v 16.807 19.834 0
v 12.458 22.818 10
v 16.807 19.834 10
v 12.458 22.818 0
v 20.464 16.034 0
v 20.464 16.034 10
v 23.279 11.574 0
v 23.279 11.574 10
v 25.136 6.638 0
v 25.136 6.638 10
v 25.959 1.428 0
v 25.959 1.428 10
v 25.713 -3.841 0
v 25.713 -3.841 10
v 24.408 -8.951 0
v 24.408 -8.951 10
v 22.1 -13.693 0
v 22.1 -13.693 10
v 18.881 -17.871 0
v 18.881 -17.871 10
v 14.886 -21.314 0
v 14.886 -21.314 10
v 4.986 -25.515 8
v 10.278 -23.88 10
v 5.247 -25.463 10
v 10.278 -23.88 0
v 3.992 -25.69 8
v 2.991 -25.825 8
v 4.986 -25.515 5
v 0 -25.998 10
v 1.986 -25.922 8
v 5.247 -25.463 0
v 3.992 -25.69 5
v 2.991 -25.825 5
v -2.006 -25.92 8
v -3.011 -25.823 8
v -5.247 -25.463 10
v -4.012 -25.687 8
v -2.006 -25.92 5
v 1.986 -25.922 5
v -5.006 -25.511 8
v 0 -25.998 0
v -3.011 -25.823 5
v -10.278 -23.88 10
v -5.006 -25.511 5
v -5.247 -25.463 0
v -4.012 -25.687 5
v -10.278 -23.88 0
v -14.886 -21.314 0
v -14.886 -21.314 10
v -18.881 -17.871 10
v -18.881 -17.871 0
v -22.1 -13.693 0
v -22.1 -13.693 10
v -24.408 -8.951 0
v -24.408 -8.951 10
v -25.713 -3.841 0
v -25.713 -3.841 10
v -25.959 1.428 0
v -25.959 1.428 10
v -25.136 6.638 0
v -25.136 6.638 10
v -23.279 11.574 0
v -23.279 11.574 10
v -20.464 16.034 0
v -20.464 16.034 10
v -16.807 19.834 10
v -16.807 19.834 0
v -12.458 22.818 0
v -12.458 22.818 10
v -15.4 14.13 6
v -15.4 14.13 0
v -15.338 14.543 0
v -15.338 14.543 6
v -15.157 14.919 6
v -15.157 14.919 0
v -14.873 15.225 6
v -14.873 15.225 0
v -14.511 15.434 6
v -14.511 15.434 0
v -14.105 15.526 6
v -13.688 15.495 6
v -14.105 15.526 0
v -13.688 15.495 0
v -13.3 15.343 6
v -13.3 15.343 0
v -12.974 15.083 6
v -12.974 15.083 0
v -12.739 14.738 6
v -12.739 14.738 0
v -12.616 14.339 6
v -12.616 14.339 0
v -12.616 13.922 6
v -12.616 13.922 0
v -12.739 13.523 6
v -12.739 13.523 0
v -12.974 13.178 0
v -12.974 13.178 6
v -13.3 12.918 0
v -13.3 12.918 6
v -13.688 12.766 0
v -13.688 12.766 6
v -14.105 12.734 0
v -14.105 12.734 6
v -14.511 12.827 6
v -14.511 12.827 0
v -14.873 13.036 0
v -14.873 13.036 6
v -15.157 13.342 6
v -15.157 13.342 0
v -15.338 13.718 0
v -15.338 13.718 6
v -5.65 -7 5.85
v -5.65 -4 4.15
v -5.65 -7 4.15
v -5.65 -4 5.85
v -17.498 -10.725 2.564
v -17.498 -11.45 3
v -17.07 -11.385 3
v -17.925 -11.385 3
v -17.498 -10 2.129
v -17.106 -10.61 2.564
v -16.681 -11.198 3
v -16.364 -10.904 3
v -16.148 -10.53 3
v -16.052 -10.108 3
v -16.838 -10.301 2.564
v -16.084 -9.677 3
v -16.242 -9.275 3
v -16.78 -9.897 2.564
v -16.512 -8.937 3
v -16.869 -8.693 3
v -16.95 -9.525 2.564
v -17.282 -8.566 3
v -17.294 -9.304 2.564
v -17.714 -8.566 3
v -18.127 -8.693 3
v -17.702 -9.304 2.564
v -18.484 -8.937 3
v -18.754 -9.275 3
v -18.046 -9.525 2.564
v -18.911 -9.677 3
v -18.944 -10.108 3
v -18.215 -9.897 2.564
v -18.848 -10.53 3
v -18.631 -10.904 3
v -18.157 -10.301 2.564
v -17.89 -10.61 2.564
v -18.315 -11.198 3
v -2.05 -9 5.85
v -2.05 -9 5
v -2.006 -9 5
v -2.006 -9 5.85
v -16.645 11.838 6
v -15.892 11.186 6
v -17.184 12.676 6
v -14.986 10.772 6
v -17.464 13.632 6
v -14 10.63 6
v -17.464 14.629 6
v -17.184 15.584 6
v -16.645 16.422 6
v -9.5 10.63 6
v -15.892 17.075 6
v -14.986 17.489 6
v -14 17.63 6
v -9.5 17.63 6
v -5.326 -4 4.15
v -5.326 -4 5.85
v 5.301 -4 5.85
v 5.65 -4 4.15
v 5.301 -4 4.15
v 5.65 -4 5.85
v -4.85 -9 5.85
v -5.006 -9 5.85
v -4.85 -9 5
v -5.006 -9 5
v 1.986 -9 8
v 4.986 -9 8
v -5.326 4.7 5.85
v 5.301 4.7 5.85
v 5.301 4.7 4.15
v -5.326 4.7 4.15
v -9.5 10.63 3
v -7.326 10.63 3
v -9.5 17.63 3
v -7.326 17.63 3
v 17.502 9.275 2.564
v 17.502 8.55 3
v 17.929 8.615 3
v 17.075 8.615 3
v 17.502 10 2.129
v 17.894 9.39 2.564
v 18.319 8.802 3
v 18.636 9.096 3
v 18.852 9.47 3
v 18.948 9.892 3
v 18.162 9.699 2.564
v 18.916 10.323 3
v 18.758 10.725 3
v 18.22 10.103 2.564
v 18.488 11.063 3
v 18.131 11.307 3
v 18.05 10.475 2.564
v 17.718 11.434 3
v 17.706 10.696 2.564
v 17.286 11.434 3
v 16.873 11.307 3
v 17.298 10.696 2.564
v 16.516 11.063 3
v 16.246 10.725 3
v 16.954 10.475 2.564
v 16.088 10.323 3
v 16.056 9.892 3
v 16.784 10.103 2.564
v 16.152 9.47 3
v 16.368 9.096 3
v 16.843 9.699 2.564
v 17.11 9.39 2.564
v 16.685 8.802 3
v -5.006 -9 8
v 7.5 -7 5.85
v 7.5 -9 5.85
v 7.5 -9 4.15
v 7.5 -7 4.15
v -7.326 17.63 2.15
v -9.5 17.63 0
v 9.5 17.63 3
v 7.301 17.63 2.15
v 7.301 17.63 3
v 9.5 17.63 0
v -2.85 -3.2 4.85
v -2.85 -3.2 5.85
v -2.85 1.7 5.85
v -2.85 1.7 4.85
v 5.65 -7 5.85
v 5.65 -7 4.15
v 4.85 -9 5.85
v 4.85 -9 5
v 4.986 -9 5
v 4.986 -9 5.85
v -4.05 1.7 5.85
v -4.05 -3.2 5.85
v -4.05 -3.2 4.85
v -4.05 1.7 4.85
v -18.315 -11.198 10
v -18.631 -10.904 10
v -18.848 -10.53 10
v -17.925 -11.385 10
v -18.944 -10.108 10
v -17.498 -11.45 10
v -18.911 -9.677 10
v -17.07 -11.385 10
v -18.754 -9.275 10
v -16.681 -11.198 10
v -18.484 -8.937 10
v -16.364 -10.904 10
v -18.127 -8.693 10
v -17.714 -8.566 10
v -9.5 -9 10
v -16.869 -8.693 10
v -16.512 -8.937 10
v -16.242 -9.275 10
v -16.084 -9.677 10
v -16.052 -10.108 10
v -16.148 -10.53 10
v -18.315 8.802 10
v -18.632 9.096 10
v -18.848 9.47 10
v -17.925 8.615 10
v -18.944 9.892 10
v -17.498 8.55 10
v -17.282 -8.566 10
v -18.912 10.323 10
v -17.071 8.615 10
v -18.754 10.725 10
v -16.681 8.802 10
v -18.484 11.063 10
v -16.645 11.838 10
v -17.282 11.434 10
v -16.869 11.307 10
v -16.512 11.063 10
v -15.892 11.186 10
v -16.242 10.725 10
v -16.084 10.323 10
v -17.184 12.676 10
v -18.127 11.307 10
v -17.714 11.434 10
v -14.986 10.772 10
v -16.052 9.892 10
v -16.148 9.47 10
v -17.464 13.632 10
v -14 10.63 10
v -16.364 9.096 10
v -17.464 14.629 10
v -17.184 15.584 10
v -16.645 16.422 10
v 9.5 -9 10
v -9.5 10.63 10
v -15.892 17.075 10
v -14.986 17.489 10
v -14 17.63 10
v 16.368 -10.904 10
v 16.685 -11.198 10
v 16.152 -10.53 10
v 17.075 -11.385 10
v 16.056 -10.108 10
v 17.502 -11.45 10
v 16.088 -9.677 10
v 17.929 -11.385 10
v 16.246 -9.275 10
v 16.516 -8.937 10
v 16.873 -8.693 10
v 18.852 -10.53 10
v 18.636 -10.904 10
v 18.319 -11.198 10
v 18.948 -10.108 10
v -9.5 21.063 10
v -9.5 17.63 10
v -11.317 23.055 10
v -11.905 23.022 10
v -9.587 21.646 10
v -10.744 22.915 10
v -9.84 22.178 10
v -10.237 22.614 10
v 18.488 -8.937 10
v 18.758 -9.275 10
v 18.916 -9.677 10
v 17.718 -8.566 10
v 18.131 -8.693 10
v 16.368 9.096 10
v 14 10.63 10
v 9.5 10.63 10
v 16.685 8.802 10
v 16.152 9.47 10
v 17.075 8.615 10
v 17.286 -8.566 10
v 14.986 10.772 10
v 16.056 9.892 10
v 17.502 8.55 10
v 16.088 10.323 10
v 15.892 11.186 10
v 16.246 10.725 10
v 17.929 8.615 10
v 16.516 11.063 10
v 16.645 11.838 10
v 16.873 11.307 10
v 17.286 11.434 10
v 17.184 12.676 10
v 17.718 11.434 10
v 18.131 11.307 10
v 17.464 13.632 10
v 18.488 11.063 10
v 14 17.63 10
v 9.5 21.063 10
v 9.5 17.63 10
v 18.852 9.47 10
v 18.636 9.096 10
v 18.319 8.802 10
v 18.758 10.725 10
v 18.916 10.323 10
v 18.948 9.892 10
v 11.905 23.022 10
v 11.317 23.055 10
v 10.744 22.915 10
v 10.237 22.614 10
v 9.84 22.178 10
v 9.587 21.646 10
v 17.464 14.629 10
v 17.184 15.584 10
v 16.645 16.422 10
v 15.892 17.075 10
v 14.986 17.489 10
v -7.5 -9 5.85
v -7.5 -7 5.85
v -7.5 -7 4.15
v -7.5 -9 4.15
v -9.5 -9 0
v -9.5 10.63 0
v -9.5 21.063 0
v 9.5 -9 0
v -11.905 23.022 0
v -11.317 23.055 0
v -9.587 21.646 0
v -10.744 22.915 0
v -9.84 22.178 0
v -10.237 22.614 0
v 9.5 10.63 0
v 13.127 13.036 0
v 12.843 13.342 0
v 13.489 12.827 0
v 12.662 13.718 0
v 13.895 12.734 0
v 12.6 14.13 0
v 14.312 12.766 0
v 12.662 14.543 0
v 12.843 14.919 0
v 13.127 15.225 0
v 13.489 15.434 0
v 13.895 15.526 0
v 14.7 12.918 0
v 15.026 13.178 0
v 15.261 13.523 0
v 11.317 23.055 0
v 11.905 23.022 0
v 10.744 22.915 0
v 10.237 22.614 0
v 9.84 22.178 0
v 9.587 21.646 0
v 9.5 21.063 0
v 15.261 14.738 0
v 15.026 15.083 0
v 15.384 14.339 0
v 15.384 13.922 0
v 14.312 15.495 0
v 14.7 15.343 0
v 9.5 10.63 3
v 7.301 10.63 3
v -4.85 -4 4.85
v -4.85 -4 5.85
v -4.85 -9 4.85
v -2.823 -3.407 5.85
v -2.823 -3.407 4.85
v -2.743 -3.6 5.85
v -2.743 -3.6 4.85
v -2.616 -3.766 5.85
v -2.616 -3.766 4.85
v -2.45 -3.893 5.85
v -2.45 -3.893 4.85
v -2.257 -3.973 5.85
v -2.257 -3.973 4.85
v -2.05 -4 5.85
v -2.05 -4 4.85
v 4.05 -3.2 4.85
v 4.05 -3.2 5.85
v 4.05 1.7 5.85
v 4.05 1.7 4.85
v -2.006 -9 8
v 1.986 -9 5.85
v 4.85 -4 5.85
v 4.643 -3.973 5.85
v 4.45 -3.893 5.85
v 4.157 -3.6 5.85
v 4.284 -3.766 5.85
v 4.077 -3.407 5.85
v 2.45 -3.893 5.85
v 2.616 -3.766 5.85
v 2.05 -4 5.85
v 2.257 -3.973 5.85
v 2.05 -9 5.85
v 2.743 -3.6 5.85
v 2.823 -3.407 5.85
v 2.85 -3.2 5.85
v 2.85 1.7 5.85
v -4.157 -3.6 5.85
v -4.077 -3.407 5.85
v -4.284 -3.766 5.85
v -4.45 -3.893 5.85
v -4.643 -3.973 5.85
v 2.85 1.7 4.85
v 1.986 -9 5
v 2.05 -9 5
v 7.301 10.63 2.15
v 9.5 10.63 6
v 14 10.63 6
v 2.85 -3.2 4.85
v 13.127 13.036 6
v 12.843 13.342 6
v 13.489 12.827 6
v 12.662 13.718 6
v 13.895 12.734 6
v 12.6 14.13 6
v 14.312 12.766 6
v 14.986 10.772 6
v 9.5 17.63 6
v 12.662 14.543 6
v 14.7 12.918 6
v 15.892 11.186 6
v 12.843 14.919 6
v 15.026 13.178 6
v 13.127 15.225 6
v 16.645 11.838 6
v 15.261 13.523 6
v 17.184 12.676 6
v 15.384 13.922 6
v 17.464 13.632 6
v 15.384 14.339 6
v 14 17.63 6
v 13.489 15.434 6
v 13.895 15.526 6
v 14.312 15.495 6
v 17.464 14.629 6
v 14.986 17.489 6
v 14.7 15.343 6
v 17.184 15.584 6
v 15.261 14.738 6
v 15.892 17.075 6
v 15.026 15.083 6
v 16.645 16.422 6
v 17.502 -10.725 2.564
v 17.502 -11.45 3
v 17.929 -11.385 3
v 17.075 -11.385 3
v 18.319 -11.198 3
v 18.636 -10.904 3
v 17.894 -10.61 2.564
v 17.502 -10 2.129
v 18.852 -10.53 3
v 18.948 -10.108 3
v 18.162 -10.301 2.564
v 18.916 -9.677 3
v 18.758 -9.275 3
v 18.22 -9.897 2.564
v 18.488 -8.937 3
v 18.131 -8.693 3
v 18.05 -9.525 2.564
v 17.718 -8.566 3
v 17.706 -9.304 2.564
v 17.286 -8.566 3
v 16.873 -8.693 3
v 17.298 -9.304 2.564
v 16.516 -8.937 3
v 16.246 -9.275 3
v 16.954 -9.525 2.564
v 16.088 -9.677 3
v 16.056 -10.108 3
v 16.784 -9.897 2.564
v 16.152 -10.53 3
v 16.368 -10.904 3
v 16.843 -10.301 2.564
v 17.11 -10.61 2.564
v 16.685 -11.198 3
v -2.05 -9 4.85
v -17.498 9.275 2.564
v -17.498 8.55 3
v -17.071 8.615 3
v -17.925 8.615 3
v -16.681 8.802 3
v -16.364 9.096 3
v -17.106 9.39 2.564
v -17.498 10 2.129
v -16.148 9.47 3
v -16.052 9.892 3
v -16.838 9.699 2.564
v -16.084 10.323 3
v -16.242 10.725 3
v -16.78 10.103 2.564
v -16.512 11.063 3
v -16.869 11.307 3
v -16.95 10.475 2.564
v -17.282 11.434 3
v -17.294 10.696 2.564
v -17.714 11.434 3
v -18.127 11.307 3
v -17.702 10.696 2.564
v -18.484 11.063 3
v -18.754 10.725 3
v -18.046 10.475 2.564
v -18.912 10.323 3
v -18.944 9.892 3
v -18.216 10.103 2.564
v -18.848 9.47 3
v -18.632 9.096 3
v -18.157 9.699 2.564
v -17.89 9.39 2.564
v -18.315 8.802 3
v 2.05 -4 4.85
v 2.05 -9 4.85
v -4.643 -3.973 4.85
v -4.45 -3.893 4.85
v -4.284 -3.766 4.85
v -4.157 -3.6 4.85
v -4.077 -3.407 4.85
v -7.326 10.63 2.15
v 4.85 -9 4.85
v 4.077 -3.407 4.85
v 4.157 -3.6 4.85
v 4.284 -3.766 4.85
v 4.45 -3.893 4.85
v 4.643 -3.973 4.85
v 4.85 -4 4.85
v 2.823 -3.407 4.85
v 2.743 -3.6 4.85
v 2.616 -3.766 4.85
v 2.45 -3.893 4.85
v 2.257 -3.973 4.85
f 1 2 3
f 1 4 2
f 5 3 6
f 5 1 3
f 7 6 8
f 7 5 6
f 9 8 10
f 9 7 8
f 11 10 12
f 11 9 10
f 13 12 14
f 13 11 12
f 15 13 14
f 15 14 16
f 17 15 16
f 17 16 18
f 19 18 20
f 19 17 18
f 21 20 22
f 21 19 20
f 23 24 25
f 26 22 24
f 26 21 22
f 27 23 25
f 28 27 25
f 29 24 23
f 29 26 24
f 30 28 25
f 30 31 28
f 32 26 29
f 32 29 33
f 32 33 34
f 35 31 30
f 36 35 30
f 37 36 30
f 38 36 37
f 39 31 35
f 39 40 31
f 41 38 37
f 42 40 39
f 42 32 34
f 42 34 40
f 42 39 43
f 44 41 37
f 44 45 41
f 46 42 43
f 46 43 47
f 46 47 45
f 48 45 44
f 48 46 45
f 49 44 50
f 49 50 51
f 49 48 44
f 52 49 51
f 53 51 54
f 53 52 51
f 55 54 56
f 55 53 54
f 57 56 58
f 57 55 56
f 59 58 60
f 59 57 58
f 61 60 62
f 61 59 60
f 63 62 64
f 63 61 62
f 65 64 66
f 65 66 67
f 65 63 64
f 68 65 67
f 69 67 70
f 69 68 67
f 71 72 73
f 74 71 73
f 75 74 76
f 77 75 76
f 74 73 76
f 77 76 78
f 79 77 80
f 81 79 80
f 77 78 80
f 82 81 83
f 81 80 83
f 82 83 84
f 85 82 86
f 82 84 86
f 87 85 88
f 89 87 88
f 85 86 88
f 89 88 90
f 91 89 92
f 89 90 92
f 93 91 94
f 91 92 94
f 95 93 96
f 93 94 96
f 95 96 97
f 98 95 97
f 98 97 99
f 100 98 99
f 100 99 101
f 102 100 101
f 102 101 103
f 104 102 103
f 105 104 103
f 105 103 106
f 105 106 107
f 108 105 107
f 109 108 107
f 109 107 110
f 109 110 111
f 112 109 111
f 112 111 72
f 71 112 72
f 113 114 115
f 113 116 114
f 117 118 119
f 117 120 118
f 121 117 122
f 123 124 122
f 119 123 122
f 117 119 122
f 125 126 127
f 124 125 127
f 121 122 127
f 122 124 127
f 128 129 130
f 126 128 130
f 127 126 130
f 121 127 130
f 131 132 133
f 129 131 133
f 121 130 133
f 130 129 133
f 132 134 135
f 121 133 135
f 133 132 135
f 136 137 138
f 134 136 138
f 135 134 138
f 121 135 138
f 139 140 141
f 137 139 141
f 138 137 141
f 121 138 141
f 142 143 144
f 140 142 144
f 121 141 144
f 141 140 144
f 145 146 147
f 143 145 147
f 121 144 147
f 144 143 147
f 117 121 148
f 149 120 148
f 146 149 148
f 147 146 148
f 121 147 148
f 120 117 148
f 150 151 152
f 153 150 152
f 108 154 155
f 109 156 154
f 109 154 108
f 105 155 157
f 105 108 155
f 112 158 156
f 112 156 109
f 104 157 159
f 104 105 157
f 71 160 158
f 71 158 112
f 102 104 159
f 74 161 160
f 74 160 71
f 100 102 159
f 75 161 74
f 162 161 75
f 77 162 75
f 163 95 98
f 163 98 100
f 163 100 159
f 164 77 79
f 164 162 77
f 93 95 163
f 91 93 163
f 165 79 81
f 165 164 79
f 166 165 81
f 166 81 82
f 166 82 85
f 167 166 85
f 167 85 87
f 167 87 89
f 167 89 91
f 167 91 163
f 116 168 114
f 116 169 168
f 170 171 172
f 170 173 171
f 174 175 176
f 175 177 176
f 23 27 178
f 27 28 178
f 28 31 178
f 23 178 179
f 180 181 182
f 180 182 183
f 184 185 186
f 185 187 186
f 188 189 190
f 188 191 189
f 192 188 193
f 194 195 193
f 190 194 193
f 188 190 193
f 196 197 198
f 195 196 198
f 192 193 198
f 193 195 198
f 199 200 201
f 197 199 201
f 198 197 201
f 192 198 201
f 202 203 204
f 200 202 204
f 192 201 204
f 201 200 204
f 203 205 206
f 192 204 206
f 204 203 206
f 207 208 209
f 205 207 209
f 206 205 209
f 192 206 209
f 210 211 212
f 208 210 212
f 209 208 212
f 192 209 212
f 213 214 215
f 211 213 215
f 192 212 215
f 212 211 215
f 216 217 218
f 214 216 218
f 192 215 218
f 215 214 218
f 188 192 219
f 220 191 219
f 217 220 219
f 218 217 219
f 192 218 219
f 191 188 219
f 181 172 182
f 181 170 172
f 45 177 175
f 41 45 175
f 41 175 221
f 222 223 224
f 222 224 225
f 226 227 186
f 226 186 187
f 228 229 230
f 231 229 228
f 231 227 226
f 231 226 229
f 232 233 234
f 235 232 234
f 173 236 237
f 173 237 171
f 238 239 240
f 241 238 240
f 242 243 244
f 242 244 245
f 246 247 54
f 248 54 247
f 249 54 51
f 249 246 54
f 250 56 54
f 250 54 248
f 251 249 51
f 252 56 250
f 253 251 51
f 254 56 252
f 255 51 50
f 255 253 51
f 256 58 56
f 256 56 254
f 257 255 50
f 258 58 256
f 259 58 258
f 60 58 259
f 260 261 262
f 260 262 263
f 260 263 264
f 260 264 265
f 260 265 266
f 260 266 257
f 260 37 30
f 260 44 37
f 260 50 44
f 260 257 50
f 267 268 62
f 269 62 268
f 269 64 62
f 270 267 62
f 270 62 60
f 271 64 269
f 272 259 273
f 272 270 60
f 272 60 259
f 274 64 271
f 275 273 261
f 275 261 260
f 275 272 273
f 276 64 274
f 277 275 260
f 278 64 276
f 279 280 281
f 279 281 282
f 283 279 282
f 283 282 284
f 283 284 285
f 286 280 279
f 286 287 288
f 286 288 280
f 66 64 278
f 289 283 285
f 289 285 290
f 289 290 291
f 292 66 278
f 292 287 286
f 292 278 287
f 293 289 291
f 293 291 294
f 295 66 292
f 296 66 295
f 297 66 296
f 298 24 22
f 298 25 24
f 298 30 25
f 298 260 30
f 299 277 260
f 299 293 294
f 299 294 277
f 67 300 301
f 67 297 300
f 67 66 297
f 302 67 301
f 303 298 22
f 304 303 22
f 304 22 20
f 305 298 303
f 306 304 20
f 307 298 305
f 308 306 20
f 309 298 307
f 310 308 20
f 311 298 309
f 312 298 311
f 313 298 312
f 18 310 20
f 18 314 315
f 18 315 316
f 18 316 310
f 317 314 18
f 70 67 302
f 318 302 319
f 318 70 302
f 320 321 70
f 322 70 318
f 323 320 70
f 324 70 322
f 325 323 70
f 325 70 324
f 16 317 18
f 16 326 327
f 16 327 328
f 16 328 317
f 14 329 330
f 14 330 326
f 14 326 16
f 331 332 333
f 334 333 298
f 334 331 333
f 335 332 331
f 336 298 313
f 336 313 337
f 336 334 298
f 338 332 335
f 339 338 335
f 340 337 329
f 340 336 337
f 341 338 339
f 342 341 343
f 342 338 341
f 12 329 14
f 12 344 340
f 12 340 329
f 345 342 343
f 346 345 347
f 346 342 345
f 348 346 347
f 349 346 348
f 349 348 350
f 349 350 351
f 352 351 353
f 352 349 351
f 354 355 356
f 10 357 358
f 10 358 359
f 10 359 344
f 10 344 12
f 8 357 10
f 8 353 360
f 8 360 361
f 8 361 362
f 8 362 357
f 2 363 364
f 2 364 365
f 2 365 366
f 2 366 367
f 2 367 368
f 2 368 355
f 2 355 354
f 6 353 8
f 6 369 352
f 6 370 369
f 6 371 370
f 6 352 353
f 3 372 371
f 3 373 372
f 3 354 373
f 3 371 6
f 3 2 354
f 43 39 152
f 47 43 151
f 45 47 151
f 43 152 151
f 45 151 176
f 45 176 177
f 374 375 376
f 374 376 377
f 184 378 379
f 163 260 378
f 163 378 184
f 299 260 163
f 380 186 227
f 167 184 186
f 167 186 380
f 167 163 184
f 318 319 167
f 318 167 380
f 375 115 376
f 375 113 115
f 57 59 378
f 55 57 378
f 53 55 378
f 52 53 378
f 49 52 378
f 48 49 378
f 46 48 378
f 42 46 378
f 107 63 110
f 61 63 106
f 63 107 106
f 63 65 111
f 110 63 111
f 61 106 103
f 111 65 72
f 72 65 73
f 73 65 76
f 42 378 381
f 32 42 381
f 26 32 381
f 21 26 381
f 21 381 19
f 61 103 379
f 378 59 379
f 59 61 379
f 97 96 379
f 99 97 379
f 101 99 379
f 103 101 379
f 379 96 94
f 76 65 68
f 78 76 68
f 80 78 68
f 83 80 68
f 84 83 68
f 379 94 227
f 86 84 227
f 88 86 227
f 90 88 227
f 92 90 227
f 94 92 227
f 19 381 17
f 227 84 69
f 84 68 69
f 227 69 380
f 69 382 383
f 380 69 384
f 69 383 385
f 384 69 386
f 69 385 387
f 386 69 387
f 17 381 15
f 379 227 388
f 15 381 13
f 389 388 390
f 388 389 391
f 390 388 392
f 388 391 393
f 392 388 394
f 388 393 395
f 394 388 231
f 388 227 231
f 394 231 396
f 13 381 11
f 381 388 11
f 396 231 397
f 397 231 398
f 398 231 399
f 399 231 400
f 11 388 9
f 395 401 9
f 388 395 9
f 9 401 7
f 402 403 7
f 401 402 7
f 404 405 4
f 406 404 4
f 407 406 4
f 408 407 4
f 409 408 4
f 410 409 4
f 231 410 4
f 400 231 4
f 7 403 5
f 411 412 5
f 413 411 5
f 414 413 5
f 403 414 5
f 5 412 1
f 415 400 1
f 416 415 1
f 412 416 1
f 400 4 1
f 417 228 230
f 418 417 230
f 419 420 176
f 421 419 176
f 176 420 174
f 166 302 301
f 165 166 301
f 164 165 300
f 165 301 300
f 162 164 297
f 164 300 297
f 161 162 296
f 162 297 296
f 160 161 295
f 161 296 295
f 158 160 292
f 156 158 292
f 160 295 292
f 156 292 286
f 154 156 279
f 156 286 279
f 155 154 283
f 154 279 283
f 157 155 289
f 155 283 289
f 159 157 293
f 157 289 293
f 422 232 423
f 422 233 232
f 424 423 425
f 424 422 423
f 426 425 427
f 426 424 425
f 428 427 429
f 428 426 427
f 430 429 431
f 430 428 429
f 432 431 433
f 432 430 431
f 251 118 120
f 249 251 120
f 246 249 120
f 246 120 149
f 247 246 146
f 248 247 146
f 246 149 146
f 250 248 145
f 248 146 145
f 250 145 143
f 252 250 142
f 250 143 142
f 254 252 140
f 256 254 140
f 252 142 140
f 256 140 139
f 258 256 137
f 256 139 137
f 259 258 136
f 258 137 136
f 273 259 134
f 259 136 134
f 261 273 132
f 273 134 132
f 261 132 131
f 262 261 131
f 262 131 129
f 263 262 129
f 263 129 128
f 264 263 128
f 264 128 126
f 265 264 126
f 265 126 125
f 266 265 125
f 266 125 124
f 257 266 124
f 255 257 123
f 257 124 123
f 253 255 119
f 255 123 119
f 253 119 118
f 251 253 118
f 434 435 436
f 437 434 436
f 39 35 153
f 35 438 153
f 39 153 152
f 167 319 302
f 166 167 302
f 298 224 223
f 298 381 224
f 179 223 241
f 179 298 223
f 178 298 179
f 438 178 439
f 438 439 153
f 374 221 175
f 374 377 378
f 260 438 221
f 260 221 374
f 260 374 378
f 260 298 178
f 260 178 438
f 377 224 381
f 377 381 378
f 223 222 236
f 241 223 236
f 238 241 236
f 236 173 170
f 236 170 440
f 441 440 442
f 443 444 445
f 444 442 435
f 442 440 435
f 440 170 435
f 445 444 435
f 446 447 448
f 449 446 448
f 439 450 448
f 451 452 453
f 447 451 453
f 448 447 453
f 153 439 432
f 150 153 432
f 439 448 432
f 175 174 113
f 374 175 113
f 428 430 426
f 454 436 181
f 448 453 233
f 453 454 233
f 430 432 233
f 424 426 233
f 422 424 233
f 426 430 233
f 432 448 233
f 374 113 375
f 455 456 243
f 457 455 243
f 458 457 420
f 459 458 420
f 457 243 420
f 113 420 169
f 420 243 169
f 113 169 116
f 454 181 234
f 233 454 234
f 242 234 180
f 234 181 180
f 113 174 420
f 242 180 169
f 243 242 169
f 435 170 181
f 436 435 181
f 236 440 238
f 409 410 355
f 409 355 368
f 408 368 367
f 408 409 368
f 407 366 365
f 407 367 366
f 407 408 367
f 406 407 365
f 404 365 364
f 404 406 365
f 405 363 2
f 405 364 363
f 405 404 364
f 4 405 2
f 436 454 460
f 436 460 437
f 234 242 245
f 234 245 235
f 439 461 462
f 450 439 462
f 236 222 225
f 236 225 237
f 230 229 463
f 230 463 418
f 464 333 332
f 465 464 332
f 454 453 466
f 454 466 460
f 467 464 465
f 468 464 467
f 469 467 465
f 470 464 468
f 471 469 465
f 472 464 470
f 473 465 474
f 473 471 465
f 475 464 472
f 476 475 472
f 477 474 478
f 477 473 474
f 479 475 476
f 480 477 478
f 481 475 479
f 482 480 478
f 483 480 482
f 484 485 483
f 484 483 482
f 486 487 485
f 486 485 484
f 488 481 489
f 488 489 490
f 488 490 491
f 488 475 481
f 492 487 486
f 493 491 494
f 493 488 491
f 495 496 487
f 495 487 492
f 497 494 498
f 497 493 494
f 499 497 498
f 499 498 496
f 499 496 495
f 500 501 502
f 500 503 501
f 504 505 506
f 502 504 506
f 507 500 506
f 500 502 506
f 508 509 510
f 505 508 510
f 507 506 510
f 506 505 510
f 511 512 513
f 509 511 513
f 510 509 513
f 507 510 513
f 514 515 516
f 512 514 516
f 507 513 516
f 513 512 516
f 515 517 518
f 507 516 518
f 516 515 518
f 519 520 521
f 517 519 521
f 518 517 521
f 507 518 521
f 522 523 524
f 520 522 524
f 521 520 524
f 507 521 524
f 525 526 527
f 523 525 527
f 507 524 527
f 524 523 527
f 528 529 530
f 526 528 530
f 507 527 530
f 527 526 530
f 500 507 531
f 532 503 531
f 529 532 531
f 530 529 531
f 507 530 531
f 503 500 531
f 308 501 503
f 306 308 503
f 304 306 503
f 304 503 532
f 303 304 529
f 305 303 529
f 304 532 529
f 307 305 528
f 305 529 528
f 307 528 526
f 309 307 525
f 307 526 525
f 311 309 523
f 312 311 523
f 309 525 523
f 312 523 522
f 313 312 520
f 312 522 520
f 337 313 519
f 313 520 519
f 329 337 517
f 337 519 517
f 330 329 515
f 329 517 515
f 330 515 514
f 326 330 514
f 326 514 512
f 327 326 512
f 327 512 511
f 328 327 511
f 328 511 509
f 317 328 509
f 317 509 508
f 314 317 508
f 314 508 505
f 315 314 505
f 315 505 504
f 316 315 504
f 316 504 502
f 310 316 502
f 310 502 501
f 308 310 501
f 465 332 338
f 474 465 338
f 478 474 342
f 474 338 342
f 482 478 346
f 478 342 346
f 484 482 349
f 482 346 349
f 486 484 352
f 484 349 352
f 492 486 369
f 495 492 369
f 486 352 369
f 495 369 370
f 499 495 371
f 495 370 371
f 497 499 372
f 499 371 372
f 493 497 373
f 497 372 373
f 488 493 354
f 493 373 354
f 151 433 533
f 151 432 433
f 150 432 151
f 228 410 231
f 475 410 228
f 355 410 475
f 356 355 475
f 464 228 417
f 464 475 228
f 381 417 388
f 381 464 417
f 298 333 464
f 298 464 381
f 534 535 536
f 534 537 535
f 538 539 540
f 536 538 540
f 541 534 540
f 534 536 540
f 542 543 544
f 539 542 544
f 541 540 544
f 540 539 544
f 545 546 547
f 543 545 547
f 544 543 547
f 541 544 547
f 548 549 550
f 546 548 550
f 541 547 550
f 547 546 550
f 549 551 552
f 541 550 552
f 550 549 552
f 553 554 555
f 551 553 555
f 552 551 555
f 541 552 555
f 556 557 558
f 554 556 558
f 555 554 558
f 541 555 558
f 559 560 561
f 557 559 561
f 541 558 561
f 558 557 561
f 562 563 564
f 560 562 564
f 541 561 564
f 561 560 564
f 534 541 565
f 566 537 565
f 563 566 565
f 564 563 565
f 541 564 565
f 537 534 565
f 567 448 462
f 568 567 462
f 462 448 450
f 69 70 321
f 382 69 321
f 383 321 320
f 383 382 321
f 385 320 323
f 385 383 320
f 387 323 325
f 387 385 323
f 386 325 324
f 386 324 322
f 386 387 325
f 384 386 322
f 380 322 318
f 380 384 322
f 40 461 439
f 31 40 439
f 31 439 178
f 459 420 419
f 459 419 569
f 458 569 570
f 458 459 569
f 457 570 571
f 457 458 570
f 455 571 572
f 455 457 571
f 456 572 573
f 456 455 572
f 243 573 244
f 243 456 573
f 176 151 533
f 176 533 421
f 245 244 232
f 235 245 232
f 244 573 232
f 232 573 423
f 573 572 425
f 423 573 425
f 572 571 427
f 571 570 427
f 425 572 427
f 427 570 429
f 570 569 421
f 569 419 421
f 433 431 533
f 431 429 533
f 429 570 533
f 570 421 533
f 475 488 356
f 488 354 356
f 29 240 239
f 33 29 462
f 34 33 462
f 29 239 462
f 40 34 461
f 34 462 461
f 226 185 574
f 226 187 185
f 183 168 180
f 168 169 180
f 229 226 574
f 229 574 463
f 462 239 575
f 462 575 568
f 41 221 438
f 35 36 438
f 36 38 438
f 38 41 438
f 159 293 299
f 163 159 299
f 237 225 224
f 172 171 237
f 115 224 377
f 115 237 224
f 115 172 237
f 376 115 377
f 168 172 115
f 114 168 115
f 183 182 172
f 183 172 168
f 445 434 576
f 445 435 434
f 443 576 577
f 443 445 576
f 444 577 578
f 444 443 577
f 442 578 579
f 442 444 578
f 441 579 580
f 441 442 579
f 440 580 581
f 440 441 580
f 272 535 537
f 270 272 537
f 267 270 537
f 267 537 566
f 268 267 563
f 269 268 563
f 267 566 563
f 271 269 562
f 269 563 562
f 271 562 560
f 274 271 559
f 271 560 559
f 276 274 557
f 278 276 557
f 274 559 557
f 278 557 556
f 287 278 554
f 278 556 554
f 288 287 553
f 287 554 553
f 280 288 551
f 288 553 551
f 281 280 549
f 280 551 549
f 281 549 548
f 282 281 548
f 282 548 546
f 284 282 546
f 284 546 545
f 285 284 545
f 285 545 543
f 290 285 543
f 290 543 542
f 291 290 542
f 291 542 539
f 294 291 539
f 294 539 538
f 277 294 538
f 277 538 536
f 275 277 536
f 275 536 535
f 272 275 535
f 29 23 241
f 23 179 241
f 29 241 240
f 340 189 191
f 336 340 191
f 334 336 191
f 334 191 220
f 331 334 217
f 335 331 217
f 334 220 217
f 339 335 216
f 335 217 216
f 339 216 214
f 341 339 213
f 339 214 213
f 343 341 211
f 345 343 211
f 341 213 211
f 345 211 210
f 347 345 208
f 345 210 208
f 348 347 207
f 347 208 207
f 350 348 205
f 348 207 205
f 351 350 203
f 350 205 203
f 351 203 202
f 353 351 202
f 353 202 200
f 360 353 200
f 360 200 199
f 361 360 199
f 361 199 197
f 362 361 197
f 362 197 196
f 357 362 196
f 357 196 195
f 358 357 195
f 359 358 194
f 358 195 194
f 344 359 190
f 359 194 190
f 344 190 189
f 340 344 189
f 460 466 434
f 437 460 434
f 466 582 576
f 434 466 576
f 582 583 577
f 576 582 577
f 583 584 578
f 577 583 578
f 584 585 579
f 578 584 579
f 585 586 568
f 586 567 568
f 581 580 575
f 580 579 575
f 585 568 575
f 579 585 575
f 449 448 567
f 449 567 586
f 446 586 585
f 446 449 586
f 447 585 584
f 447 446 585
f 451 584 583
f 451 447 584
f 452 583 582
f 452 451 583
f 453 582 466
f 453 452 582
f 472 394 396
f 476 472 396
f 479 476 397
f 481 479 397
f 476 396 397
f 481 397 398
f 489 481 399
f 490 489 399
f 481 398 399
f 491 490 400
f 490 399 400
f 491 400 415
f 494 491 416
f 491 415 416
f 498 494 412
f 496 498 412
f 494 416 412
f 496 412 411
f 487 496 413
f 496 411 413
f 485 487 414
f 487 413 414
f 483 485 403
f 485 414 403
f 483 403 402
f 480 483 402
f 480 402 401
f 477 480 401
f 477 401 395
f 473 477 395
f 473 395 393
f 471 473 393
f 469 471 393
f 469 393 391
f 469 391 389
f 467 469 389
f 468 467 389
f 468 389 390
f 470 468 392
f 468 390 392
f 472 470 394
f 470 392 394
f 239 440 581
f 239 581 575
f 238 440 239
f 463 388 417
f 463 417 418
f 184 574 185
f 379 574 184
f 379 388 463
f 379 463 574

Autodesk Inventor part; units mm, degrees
ref_plane "YZ Plane" through (0, 0, 0) normal (1, 0, 0) x (0, 1, 0)
ref_plane "XZ Plane" through (0, 0, 0) normal (0, 1, 0) x (-1, 0, 0)
ref_plane "XY Plane" through (0, 0, 0) normal (0, 0, 1) x (1, 0, 0)
ref_plane "Work Plane1" through (0, 0, 0) normal (0, 0, 1) x (1, 0, 0)
sketch "Sketch1" plane through (0, 0, 0) normal (0, 0, 1) x (1, 0, 0)
  circle A0 centre (0, 0) radius 25.9979 projected
  circle A1 centre (-9.4998, -11.0022) radius 2.6601 projected
  circle A2 centre (0.0001, -0.0022) radius 3.8801 projected
  circle A3 centre (0.0001, -0.0022) radius 6.7754 projected
  circle A4 centre (0.0001, -0.0022) radius 10
  point P0 (0, 0)
  dimension "d17" = 20
extrude "Extrusion1" add sketch "Sketch1" along normal blind 10 contours A0 | A1 | A2 | A3 | A4
ref_plane "Arbeitsebene4" through (0, 0, 5) normal (0, 0, -1) x (-1, 0, 0)
sketch "Skizze22" plane through (0, 0, 10) normal (0, 0, 1) x (1, 0, 0)
  circle A0 centre (0, 0) radius 25.9979 projected
  line L0 (-9.5, 60.9958) -> (9.5, 60.9958)
  line L1 (9.5, 60.9958) -> (9.5, -9)
  line L2 (9.5, -9) -> (-9.5, -9)
  line L3 (-9.5, -9) -> (-9.5, 60.9958)
  line L4 (-9.5, 60.9958) -> (9.5, -9) construction
  line L5 (9.5, 60.9958) -> (-9.5, -9) construction
  point P0 (0, 0)
  point P1 (0, 25.9979)
  point P2 (2.05, -9)
  dimension "d82" = 19
extrude "Extrusion16" cut sketch "Skizze22" against normal blind 10 contours L1 L2 L3 A0 | A0 L3 L0 L1 picked at (-1.0778, 2.5987)
sketch "Skizze23" plane through (0, 0, 5) normal (0, 0, -1) x (-1, 0, 0)
  line L0 (-5.5015, 4.1) -> (-5.3008, 4.7) projected
  line L1 (-5.3008, 4.7) -> (5.3257, 4.7) projected
  line L2 (5.3257, 4.7) -> (5.5015, 4.1) projected
  line L3 (5.5015, 4.1) -> (5.65, 3.9515) projected
  line L4 (5.65, 3.9515) -> (5.65, -4) projected
  line L5 (4.85, -4) -> (5.65, -4) projected
  arc A0 (4.05, -3.2) -> (4.85, -4) centre (4.85, -3.2) ccw projected
  line L6 (4.05, -3.2) -> (4.05, 1.7) projected
  line L7 (4.05, 1.7) -> (2.85, 1.7) projected
  line L8 (2.85, -3.2) -> (2.85, 1.7) projected
  arc A1 (2.05, -4) -> (2.85, -3.2) centre (2.05, -3.2) ccw projected
  line L9 (-2.05, -4) -> (2.05, -4) projected
  arc A2 (-2.85, -3.2) -> (-2.05, -4) centre (-2.05, -3.2) ccw projected
  line L10 (-2.85, -3.2) -> (-2.85, 1.7) projected
  line L11 (-2.85, 1.7) -> (-4.05, 1.7) projected
  line L12 (-4.05, -3.2) -> (-4.05, 1.7) projected
  arc A3 (-4.85, -4) -> (-4.05, -3.2) centre (-4.85, -3.2) ccw projected
  line L13 (-5.65, -4) -> (-4.85, -4) projected
  line L14 (-5.65, -4) -> (-5.65, 3.9515) projected
  line L15 (-5.65, 3.9515) -> (-5.5015, 4.1) projected
  line L16 (5.65, -4) -> (5.65, -7) projected
  line L17 (5.65, -7) -> (7.5, -7) projected
  line L18 (7.5, -7) -> (7.5, -9) projected
  line L19 (7.5, -9) -> (4.85, -9) projected
  line L20 (4.85, -6) -> (4.85, -9) projected
  line L21 (4.85, -4) -> (4.85, -6) projected
  line L22 (4.85, -4) -> (5.65, -4) projected
  line L23 (-5.65, -7) -> (-5.65, -4) projected
  line L24 (-5.65, -4) -> (-4.85, -4) projected
  line L25 (-4.85, -4) -> (-4.85, -6) projected
  line L26 (-4.85, -6) -> (-4.85, -9) projected
  line L27 (-4.85, -9) -> (-7.5, -9) projected
  line L28 (-7.5, -9) -> (-7.5, -7) projected
  line L29 (-7.5, -7) -> (-5.65, -7) projected
  line L30 (-4.85, -9) -> (4.85, -9)
  line L31 (5.65, -7) -> (5.3257, -7)
  line L32 (5.3257, -7) -> (5.3257, 4.7)
  line L33 (5.3257, 4.7) -> (5.65, 4.7)
  line L34 (5.65, 4.7) -> (5.65, -7)
  line L35 (-5.3008, 4.7) -> (-5.65, 4.7)
  line L36 (-5.65, 4.7) -> (-5.65, -7)
  line L37 (-5.65, -7) -> (-5.3008, -7)
  line L38 (-5.3008, -7) -> (-5.3008, 4.7)
  point P0 (5.3257, -4)
  point P1 (-5.3008, -4)
extrude "Extrusion17" add sketch "Skizze23" along normal mid plane 1.7 contours L1 L32 L5 A0 L6 L7 L8 A1 L9 A2 L10 L11 L12 A3 L13 L38 | L38 L37 L23 L13 | L13 L25 L26 L27 L28 L29 L37 L38 | L32 L31 L17 L18 L19 L20 L21 L5 | L5 L16 L31 L32 | A3 L12 L11 L10 A2 L9 A1 L8 L7 L6 A0 L21 L20 L30 L26 L25
sketch "Skizze24" plane through (0, 0, 5.85) normal (0, 0, -1) x (1, 0, 0)
  line L0 (2.85, 3.2) -> (2.85, -1.7) projected
  line L1 (2.85, -1.7) -> (4.05, -1.7) projected
  line L2 (4.05, 3.2) -> (4.05, -1.7) projected
  arc A0 (4.85, 4) -> (4.05, 3.2) centre (4.85, 3.2) ccw projected
  line L3 (4.85, 4) -> (4.85, 6) projected
  arc A1 (2.85, 3.2) -> (2.05, 4) centre (2.05, 3.2) ccw projected
  line L4 (2.05, 4) -> (2.05, 6) projected
  line L5 (4.85, 6) -> (4.85, 9) projected
  line L6 (2.05, 6) -> (2.05, 9) projected
  line L7 (9.5, 9) -> (-9.5, 9) projected
  line L8 (-2.05, 6) -> (-2.05, 9) projected
  line L9 (-4.85, 6) -> (-4.85, 9) projected
  line L10 (-2.15, 5.5641) -> (-2.15, 4)
  line L11 (-2.05, 4) -> (-2.05, 6) projected
  line L12 (-4.85, 4) -> (-4.85, 6) projected
  arc A2 (-4.05, 3.2) -> (-4.85, 4) centre (-4.85, 3.2) ccw projected
  arc A3 (-2.05, 4) -> (-2.85, 3.2) centre (-2.05, 3.2) ccw projected
  line L13 (-2.85, 3.2) -> (-2.85, -1.7) projected
  line L14 (-4.05, 3.2) -> (-4.05, -1.7) projected
  line L15 (-4.05, -1.7) -> (-2.85, -1.7) projected
extrude "Extrusion18" cut sketch "Skizze24" along normal blind 1
sketch "Skizze25" plane through (-9.5, -9, 10) normal (0, 1, 0) x (1, 0, 0)
  line L0 (14.4863, 5) -> (11.4863, 5)
  line L1 (11.4863, 5) -> (11.4863, 2)
  line L2 (11.4863, 2) -> (14.4863, 2)
  line L3 (14.4863, 2) -> (14.4863, 5)
  line L4 (7.4938, 5) -> (4.4938, 5)
  line L5 (4.4938, 5) -> (4.4938, 2)
  line L6 (4.4938, 2) -> (7.4938, 2)
  line L7 (7.4938, 2) -> (7.4938, 5)
  line L8 (19, 0) -> (0, 0) projected
  line L9 (19, 0) -> (19, 10) projected
  line L10 (0, 10) -> (19, 10) projected
  line L11 (0, 0) -> (0, 10) projected
  point P0 (9.5, 10)
  dimension "d90" = 3
  dimension "d91" = 3
  dimension "d92" = 3
  dimension "d93" = 3
extrude "Extrusion19" cut sketch "Skizze25" against normal through all contours L3 L2 L1 L0 | L7 L6 L5 L4
sketch "Skizze26" plane through (0, 0, 10) normal (0, 0, 1) x (1, 0, 0)
  line L0 (9.5, 24.2) -> (9.5, -9) projected
  line L1 (9.5, -9) -> (-9.5, -9) projected
  line L2 (-9.5, -9) -> (-9.5, 24.2) projected
  arc A0 (-9.5, 24.2) -> (9.5, 24.2) centre (0, 0) ccw projected
  line L3 (-14, 14.1304) -> (14, 14.1304) construction
  line L4 (-14, 10.6304) -> (14, 10.6304)
  line L5 (14, 17.6304) -> (-14, 17.6304)
  arc A1 (-14, 17.6304) -> (-14, 10.6304) centre (-14, 14.1304) ccw
  arc A2 (14, 10.6304) -> (14, 17.6304) centre (14, 14.1304) ccw
  point P0 (0, 0)
  point P1 (0, 14.1304)
  dimension "d96" = 14
  dimension "d97" = 7
extrude "Extrusion20" cut sketch "Skizze26" against normal blind 4 contours L5 A2 L4 L0 | L0 L4 L2 L5 | L2 L4 A1 L5
sketch "Skizze27" plane through (0, 0, 0) normal (0, 0, -1) x (-1, 0, 0)
  line L0 (-9.5, 10.6304) -> (-9.5, 17.6304) projected
  line L1 (-14, 10.6304) -> (-9.5, 10.6304) projected
  arc A0 (-14, 17.6304) -> (-14, 10.6304) centre (-14, 14.1304) ccw projected
  line L2 (-9.5, 17.6304) -> (-14, 17.6304) projected
  line L3 (9.5, 17.6304) -> (9.5, 10.6304) projected
  line L4 (14, 17.6304) -> (9.5, 17.6304) projected
  arc A1 (14, 10.6304) -> (14, 17.6304) centre (14, 14.1304) ccw projected
  line L5 (9.5, 10.6304) -> (14, 10.6304) projected
  line L6 (9.5, 17.6304) -> (9.5, 10.6304) projected
  line L7 (-9.5, 17.6304) -> (-14, 17.6304) projected
  line L8 (9.5, 10.6304) -> (-9.5, 10.6304)
  line L9 (-9.5, 10.6304) -> (-9.5, 17.6304)
  line L10 (-9.5, 17.6304) -> (9.5, 17.6304)
  line L11 (9.5, 17.6304) -> (9.5, 10.6304)
  point P0 (0, 0)
extrude "Extrusion21" add sketch "Skizze27" against normal blind 3
sketch "Skizze28" plane through (0, 0, 0) normal (0, 0, -1) x (-1, 0, 0)
  arc A0 (-14, 17.6304) -> (-14, 10.6304) centre (-14, 14.1304) ccw projected
  arc A1 (14, 10.6304) -> (14, 17.6304) centre (14, 14.1304) ccw projected
  circle A2 centre (-14, 14.1304) radius 1.4
  circle A3 centre (14, 14.1304) radius 1.4
  point P0 (0, 0)
  dimension "d102" = 2.8
  dimension "d103" = 2.8
extrude "Extrusion22" cut sketch "Skizze28" against normal through all
fillet "Rundung3" radius 2 2 edges at (9.5, 24.2, 5) (-9.5, 24.2, 5)
ref_plane "Arbeitsebene5" through (0, 0, 5) normal (0, 0, 1) x (1, 0, 0)
sketch "Skizze29" plane through (0, 0, 10) normal (0, 0, 1) x (1, 0, 0)
  point P0 (0, 0)
sketch "Skizze30" plane through (0, 0, 10) normal (0, 0, 1) x (1, 0, 0)
  circle A0 centre (-17.4978, -9.9998) radius 1.3999 projected
  circle A1 centre (-17.4979, 10.0001) radius 1.4 projected
  circle A2 centre (17.5021, 10.0001) radius 1.4 projected
  circle A3 centre (17.5021, -9.9999) radius 1.4001 projected
  circle A4 centre (0.0022, 0.0001) radius 3.95 projected
  circle A5 centre (11.0022, -9.4998) radius 2.6601 projected
  line L0 (19.0307, -17.7122) -> (18.4312, -14.7304) projected
  line L1 (18.4312, -14.7304) -> (15.4222, -13.716) projected
  line L2 (15.4222, -13.716) -> (13.0391, -15.8146) projected
  line L3 (13.0391, -15.8146) -> (13.6651, -18.9277) projected
  line L4 (13.6651, -18.9277) -> (16.6741, -19.9422) projected
  line L5 (16.6741, -19.9422) -> (17.7641, -18.9823) projected
  arc A6 (7.7254, -24.8235) -> (17.7641, -18.9823) centre (0, 0) ccw projected
  arc A7 (6.496, -23.8502) -> (7.7254, -24.8235) centre (7.496, -23.8502) ccw projected
  line L6 (6.496, -23.8502) -> (6.496, -17.7002) projected
  arc A8 (6.496, -17.7002) -> (4.496, -15.7002) centre (4.496, -17.7002) ccw projected
  line L7 (4.496, -15.7002) -> (-3.4917, -15.7002) projected
  arc A9 (-3.4917, -15.7002) -> (-5.4917, -17.7002) centre (-3.4917, -17.7002) ccw projected
  line L8 (-5.4917, -17.7002) -> (-5.4917, -24.1417) projected
  arc A10 (-6.6998, -25.1198) -> (-5.4917, -24.1417) centre (-6.4917, -24.1417) ccw projected
  arc A11 (-25.545, 4.8315) -> (-6.6998, -25.1198) centre (0, 0) ccw projected
  line L9 (-25.545, 4.8315) -> (-24.0265, 3.1166) projected
  line L10 (-24.0265, 3.1166) -> (-20.9151, 3.751) projected
  line L11 (-20.9151, 3.751) -> (-19.9088, 6.7628) projected
  line L12 (-19.9088, 6.7628) -> (-22.0139, 9.1401) projected
  line L13 (-22.0139, 9.1401) -> (-24.5243, 8.6283) projected
  arc A12 (-9.6986, 24.1211) -> (-24.5243, 8.6283) centre (0, 0) ccw projected
  line L14 (-9.6986, 24.1211) -> (-10.2078, 21.7325) projected
  line L15 (-10.2078, 21.7325) -> (-7.8493, 19.6063) projected
  line L16 (-7.8493, 19.6063) -> (-4.8287, 20.5857) projected
  line L17 (-4.8287, 20.5857) -> (-4.1666, 23.6914) projected
  line L18 (-4.1666, 23.6914) -> (-5.9577, 25.306) projected
  arc A13 (19.0307, -17.7122) -> (-5.9577, 25.306) centre (0, 0) ccw projected
  point P0 (0, 0)
hole "Bohrung2" at (-17.4978, -9.9998, 10) at (-17.4979, 10.0001, 10) at (17.5021, -9.9999, 10) at (17.5021, 10.0001, 10) direction (0, 0, -1) diameter 2.9 depth 7 tip angle 118
ref_plane "Arbeitsebene6" through (0, -9, 0) normal (-1, 0, 0) x (0, 0, 1)
sketch "Skizze32" plane through (-9.5, 17.6304, 0) normal (0, 1, 0) x (1, 0, 0)
  line L0 (14.8008, -5.85) -> (14.8008, -4.15) projected
  line L1 (4.1743, -4.15) -> (14.8008, -4.15) projected
  line L2 (4.1743, -5.85) -> (4.1743, -4.15) projected
  line L3 (14.8008, -5.85) -> (4.1743, -5.85) projected
  line L4 (16.8008, -2.15) -> (16.8008, -7.85)
  line L5 (16.8008, -7.85) -> (2.1743, -7.85)
  line L6 (2.1743, -7.85) -> (2.1743, -2.15)
  line L7 (2.1743, -2.15) -> (16.8008, -2.15)
  point P0 (9.5, 0)
  dimension "d116" = 2
extrude "Extrusion24" cut sketch "Skizze32" against normal blind 7 contours L3 L2 L1 L0 | L4 L5 L6 L7
properties part number "Matchboxscope_layer_ikealamp"
